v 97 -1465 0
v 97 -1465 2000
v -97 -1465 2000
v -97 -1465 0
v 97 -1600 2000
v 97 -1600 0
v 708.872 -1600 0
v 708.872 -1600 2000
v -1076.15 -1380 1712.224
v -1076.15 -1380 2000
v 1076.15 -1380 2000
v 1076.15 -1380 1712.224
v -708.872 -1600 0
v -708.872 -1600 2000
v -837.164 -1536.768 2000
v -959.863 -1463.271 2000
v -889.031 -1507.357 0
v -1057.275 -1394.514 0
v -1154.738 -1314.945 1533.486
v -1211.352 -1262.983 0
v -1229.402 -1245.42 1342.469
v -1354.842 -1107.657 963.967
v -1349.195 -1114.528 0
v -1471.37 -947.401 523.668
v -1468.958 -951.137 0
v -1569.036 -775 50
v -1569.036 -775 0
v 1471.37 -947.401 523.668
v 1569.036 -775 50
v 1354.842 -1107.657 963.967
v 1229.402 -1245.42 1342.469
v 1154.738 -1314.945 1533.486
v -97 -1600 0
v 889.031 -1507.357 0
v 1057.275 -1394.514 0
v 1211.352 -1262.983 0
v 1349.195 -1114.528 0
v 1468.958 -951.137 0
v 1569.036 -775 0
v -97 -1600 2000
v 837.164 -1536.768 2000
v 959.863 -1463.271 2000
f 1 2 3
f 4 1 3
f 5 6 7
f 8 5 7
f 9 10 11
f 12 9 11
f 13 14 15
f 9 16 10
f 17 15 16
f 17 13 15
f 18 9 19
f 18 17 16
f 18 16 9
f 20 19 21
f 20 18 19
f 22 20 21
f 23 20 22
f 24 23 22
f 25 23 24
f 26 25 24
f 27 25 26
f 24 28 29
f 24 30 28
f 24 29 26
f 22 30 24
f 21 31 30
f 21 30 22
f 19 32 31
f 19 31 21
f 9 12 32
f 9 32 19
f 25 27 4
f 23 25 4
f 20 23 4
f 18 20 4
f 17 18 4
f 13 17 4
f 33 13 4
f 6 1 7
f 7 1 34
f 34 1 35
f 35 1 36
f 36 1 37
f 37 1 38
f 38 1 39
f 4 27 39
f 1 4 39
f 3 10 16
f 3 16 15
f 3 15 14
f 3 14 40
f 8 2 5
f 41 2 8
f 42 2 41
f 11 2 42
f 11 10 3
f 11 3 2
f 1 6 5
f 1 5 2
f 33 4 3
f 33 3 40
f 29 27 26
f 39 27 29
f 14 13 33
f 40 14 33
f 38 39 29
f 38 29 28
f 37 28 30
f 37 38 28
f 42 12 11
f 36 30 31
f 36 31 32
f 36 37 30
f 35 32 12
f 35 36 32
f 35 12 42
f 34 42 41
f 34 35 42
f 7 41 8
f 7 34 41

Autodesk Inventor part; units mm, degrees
ref_plane "YZ Plane" through (0, 0, 0) normal (1, 0, 0) x (0, 1, 0)
ref_plane "XZ Plane" through (0, 0, 0) normal (0, 1, 0) x (-1, 0, 0)
ref_plane "XY Plane" through (0, 0, 0) normal (0, 0, 1) x (1, 0, 0)
sketch "Sketch1" plane through (0, 0, 0) normal (0, 0, 1) x (1, 0, 0)
  circle A0 centre (0, 0) radius 1750
  line L0 (-1569.0363, -775) -> (1569.0363, -775)
  line L1 (-64, -1498) -> (64, -1498)
  line L2 (64, -1498) -> (64, -1600)
  line L3 (64, -1600) -> (-64, -1600)
  line L4 (-64, -1600) -> (-64, -1498)
  line L5 (-64, -1498) -> (64, -1600) construction
  line L6 (64, -1498) -> (-64, -1600) construction
  line L7 (97, -1633) -> (97, -1465)
  line L8 (97, -1465) -> (-97, -1465)
  line L9 (-97, -1465) -> (-97, -1633)
  line L10 (-97, -1633) -> (97, -1465) construction
  line L11 (97, -1633) -> (-97, -1465) construction
  line L12 (-708.8723, -1600) -> (708.8723, -1600)
  point P0 (0, -1549)
  point P1 (0, -1549)
  point P2 (97, -1600)
  point P3 (-97, -1600)
  dimension "d10" = 3500
  dimension "d12" = 33
  dimension "d13" = 33
  dimension "d14" = 102
  dimension "d15" = 128
  dimension "d16" = 1600
  dimension "d17" = 825
extrude "Extrusion1" add sketch "Sketch1" along normal blind 2000 contours L0 A0 L12 L7 L8 L9
sketch "Sketch3" plane through (0, 0, 2000) normal (0, 0, 1) x (1, 0, 0)
  arc A0 (-1569.0363, -775) -> (-708.8723, -1600) centre (0, 0) ccw projected
  line L0 (-708.8723, -1600) -> (-97, -1600) projected
  line L1 (-97, -1600) -> (-97, -1465) projected
  line L2 (-97, -1465) -> (97, -1465) projected
  line L3 (97, -1600) -> (708.8723, -1600) projected
  arc A1 (708.8723, -1600) -> (1569.0363, -775) centre (0, 0) ccw projected
  arc A2 (-1569.0363, -775) -> (-708.8723, -1600) centre (0, 0) ccw projected
  arc A3 (708.8723, -1600) -> (1569.0363, -775) centre (0, 0) ccw projected
  line L4 (-1569.0363, -775) -> (1569.0363, -775)
  line L5 (-1076.1505, -1380) -> (1076.1505, -1380)
  dimension "d35" = 605
extrude "Extrusion3" cut sketch "Sketch3" against normal blind 1950
chamfer "Chamfer1" distance 605 angle 70 1 edges at (0, -1380, 50) measured on face at (-341.0533, -1009.7104, 50)
properties part number "SlopeFloor"
